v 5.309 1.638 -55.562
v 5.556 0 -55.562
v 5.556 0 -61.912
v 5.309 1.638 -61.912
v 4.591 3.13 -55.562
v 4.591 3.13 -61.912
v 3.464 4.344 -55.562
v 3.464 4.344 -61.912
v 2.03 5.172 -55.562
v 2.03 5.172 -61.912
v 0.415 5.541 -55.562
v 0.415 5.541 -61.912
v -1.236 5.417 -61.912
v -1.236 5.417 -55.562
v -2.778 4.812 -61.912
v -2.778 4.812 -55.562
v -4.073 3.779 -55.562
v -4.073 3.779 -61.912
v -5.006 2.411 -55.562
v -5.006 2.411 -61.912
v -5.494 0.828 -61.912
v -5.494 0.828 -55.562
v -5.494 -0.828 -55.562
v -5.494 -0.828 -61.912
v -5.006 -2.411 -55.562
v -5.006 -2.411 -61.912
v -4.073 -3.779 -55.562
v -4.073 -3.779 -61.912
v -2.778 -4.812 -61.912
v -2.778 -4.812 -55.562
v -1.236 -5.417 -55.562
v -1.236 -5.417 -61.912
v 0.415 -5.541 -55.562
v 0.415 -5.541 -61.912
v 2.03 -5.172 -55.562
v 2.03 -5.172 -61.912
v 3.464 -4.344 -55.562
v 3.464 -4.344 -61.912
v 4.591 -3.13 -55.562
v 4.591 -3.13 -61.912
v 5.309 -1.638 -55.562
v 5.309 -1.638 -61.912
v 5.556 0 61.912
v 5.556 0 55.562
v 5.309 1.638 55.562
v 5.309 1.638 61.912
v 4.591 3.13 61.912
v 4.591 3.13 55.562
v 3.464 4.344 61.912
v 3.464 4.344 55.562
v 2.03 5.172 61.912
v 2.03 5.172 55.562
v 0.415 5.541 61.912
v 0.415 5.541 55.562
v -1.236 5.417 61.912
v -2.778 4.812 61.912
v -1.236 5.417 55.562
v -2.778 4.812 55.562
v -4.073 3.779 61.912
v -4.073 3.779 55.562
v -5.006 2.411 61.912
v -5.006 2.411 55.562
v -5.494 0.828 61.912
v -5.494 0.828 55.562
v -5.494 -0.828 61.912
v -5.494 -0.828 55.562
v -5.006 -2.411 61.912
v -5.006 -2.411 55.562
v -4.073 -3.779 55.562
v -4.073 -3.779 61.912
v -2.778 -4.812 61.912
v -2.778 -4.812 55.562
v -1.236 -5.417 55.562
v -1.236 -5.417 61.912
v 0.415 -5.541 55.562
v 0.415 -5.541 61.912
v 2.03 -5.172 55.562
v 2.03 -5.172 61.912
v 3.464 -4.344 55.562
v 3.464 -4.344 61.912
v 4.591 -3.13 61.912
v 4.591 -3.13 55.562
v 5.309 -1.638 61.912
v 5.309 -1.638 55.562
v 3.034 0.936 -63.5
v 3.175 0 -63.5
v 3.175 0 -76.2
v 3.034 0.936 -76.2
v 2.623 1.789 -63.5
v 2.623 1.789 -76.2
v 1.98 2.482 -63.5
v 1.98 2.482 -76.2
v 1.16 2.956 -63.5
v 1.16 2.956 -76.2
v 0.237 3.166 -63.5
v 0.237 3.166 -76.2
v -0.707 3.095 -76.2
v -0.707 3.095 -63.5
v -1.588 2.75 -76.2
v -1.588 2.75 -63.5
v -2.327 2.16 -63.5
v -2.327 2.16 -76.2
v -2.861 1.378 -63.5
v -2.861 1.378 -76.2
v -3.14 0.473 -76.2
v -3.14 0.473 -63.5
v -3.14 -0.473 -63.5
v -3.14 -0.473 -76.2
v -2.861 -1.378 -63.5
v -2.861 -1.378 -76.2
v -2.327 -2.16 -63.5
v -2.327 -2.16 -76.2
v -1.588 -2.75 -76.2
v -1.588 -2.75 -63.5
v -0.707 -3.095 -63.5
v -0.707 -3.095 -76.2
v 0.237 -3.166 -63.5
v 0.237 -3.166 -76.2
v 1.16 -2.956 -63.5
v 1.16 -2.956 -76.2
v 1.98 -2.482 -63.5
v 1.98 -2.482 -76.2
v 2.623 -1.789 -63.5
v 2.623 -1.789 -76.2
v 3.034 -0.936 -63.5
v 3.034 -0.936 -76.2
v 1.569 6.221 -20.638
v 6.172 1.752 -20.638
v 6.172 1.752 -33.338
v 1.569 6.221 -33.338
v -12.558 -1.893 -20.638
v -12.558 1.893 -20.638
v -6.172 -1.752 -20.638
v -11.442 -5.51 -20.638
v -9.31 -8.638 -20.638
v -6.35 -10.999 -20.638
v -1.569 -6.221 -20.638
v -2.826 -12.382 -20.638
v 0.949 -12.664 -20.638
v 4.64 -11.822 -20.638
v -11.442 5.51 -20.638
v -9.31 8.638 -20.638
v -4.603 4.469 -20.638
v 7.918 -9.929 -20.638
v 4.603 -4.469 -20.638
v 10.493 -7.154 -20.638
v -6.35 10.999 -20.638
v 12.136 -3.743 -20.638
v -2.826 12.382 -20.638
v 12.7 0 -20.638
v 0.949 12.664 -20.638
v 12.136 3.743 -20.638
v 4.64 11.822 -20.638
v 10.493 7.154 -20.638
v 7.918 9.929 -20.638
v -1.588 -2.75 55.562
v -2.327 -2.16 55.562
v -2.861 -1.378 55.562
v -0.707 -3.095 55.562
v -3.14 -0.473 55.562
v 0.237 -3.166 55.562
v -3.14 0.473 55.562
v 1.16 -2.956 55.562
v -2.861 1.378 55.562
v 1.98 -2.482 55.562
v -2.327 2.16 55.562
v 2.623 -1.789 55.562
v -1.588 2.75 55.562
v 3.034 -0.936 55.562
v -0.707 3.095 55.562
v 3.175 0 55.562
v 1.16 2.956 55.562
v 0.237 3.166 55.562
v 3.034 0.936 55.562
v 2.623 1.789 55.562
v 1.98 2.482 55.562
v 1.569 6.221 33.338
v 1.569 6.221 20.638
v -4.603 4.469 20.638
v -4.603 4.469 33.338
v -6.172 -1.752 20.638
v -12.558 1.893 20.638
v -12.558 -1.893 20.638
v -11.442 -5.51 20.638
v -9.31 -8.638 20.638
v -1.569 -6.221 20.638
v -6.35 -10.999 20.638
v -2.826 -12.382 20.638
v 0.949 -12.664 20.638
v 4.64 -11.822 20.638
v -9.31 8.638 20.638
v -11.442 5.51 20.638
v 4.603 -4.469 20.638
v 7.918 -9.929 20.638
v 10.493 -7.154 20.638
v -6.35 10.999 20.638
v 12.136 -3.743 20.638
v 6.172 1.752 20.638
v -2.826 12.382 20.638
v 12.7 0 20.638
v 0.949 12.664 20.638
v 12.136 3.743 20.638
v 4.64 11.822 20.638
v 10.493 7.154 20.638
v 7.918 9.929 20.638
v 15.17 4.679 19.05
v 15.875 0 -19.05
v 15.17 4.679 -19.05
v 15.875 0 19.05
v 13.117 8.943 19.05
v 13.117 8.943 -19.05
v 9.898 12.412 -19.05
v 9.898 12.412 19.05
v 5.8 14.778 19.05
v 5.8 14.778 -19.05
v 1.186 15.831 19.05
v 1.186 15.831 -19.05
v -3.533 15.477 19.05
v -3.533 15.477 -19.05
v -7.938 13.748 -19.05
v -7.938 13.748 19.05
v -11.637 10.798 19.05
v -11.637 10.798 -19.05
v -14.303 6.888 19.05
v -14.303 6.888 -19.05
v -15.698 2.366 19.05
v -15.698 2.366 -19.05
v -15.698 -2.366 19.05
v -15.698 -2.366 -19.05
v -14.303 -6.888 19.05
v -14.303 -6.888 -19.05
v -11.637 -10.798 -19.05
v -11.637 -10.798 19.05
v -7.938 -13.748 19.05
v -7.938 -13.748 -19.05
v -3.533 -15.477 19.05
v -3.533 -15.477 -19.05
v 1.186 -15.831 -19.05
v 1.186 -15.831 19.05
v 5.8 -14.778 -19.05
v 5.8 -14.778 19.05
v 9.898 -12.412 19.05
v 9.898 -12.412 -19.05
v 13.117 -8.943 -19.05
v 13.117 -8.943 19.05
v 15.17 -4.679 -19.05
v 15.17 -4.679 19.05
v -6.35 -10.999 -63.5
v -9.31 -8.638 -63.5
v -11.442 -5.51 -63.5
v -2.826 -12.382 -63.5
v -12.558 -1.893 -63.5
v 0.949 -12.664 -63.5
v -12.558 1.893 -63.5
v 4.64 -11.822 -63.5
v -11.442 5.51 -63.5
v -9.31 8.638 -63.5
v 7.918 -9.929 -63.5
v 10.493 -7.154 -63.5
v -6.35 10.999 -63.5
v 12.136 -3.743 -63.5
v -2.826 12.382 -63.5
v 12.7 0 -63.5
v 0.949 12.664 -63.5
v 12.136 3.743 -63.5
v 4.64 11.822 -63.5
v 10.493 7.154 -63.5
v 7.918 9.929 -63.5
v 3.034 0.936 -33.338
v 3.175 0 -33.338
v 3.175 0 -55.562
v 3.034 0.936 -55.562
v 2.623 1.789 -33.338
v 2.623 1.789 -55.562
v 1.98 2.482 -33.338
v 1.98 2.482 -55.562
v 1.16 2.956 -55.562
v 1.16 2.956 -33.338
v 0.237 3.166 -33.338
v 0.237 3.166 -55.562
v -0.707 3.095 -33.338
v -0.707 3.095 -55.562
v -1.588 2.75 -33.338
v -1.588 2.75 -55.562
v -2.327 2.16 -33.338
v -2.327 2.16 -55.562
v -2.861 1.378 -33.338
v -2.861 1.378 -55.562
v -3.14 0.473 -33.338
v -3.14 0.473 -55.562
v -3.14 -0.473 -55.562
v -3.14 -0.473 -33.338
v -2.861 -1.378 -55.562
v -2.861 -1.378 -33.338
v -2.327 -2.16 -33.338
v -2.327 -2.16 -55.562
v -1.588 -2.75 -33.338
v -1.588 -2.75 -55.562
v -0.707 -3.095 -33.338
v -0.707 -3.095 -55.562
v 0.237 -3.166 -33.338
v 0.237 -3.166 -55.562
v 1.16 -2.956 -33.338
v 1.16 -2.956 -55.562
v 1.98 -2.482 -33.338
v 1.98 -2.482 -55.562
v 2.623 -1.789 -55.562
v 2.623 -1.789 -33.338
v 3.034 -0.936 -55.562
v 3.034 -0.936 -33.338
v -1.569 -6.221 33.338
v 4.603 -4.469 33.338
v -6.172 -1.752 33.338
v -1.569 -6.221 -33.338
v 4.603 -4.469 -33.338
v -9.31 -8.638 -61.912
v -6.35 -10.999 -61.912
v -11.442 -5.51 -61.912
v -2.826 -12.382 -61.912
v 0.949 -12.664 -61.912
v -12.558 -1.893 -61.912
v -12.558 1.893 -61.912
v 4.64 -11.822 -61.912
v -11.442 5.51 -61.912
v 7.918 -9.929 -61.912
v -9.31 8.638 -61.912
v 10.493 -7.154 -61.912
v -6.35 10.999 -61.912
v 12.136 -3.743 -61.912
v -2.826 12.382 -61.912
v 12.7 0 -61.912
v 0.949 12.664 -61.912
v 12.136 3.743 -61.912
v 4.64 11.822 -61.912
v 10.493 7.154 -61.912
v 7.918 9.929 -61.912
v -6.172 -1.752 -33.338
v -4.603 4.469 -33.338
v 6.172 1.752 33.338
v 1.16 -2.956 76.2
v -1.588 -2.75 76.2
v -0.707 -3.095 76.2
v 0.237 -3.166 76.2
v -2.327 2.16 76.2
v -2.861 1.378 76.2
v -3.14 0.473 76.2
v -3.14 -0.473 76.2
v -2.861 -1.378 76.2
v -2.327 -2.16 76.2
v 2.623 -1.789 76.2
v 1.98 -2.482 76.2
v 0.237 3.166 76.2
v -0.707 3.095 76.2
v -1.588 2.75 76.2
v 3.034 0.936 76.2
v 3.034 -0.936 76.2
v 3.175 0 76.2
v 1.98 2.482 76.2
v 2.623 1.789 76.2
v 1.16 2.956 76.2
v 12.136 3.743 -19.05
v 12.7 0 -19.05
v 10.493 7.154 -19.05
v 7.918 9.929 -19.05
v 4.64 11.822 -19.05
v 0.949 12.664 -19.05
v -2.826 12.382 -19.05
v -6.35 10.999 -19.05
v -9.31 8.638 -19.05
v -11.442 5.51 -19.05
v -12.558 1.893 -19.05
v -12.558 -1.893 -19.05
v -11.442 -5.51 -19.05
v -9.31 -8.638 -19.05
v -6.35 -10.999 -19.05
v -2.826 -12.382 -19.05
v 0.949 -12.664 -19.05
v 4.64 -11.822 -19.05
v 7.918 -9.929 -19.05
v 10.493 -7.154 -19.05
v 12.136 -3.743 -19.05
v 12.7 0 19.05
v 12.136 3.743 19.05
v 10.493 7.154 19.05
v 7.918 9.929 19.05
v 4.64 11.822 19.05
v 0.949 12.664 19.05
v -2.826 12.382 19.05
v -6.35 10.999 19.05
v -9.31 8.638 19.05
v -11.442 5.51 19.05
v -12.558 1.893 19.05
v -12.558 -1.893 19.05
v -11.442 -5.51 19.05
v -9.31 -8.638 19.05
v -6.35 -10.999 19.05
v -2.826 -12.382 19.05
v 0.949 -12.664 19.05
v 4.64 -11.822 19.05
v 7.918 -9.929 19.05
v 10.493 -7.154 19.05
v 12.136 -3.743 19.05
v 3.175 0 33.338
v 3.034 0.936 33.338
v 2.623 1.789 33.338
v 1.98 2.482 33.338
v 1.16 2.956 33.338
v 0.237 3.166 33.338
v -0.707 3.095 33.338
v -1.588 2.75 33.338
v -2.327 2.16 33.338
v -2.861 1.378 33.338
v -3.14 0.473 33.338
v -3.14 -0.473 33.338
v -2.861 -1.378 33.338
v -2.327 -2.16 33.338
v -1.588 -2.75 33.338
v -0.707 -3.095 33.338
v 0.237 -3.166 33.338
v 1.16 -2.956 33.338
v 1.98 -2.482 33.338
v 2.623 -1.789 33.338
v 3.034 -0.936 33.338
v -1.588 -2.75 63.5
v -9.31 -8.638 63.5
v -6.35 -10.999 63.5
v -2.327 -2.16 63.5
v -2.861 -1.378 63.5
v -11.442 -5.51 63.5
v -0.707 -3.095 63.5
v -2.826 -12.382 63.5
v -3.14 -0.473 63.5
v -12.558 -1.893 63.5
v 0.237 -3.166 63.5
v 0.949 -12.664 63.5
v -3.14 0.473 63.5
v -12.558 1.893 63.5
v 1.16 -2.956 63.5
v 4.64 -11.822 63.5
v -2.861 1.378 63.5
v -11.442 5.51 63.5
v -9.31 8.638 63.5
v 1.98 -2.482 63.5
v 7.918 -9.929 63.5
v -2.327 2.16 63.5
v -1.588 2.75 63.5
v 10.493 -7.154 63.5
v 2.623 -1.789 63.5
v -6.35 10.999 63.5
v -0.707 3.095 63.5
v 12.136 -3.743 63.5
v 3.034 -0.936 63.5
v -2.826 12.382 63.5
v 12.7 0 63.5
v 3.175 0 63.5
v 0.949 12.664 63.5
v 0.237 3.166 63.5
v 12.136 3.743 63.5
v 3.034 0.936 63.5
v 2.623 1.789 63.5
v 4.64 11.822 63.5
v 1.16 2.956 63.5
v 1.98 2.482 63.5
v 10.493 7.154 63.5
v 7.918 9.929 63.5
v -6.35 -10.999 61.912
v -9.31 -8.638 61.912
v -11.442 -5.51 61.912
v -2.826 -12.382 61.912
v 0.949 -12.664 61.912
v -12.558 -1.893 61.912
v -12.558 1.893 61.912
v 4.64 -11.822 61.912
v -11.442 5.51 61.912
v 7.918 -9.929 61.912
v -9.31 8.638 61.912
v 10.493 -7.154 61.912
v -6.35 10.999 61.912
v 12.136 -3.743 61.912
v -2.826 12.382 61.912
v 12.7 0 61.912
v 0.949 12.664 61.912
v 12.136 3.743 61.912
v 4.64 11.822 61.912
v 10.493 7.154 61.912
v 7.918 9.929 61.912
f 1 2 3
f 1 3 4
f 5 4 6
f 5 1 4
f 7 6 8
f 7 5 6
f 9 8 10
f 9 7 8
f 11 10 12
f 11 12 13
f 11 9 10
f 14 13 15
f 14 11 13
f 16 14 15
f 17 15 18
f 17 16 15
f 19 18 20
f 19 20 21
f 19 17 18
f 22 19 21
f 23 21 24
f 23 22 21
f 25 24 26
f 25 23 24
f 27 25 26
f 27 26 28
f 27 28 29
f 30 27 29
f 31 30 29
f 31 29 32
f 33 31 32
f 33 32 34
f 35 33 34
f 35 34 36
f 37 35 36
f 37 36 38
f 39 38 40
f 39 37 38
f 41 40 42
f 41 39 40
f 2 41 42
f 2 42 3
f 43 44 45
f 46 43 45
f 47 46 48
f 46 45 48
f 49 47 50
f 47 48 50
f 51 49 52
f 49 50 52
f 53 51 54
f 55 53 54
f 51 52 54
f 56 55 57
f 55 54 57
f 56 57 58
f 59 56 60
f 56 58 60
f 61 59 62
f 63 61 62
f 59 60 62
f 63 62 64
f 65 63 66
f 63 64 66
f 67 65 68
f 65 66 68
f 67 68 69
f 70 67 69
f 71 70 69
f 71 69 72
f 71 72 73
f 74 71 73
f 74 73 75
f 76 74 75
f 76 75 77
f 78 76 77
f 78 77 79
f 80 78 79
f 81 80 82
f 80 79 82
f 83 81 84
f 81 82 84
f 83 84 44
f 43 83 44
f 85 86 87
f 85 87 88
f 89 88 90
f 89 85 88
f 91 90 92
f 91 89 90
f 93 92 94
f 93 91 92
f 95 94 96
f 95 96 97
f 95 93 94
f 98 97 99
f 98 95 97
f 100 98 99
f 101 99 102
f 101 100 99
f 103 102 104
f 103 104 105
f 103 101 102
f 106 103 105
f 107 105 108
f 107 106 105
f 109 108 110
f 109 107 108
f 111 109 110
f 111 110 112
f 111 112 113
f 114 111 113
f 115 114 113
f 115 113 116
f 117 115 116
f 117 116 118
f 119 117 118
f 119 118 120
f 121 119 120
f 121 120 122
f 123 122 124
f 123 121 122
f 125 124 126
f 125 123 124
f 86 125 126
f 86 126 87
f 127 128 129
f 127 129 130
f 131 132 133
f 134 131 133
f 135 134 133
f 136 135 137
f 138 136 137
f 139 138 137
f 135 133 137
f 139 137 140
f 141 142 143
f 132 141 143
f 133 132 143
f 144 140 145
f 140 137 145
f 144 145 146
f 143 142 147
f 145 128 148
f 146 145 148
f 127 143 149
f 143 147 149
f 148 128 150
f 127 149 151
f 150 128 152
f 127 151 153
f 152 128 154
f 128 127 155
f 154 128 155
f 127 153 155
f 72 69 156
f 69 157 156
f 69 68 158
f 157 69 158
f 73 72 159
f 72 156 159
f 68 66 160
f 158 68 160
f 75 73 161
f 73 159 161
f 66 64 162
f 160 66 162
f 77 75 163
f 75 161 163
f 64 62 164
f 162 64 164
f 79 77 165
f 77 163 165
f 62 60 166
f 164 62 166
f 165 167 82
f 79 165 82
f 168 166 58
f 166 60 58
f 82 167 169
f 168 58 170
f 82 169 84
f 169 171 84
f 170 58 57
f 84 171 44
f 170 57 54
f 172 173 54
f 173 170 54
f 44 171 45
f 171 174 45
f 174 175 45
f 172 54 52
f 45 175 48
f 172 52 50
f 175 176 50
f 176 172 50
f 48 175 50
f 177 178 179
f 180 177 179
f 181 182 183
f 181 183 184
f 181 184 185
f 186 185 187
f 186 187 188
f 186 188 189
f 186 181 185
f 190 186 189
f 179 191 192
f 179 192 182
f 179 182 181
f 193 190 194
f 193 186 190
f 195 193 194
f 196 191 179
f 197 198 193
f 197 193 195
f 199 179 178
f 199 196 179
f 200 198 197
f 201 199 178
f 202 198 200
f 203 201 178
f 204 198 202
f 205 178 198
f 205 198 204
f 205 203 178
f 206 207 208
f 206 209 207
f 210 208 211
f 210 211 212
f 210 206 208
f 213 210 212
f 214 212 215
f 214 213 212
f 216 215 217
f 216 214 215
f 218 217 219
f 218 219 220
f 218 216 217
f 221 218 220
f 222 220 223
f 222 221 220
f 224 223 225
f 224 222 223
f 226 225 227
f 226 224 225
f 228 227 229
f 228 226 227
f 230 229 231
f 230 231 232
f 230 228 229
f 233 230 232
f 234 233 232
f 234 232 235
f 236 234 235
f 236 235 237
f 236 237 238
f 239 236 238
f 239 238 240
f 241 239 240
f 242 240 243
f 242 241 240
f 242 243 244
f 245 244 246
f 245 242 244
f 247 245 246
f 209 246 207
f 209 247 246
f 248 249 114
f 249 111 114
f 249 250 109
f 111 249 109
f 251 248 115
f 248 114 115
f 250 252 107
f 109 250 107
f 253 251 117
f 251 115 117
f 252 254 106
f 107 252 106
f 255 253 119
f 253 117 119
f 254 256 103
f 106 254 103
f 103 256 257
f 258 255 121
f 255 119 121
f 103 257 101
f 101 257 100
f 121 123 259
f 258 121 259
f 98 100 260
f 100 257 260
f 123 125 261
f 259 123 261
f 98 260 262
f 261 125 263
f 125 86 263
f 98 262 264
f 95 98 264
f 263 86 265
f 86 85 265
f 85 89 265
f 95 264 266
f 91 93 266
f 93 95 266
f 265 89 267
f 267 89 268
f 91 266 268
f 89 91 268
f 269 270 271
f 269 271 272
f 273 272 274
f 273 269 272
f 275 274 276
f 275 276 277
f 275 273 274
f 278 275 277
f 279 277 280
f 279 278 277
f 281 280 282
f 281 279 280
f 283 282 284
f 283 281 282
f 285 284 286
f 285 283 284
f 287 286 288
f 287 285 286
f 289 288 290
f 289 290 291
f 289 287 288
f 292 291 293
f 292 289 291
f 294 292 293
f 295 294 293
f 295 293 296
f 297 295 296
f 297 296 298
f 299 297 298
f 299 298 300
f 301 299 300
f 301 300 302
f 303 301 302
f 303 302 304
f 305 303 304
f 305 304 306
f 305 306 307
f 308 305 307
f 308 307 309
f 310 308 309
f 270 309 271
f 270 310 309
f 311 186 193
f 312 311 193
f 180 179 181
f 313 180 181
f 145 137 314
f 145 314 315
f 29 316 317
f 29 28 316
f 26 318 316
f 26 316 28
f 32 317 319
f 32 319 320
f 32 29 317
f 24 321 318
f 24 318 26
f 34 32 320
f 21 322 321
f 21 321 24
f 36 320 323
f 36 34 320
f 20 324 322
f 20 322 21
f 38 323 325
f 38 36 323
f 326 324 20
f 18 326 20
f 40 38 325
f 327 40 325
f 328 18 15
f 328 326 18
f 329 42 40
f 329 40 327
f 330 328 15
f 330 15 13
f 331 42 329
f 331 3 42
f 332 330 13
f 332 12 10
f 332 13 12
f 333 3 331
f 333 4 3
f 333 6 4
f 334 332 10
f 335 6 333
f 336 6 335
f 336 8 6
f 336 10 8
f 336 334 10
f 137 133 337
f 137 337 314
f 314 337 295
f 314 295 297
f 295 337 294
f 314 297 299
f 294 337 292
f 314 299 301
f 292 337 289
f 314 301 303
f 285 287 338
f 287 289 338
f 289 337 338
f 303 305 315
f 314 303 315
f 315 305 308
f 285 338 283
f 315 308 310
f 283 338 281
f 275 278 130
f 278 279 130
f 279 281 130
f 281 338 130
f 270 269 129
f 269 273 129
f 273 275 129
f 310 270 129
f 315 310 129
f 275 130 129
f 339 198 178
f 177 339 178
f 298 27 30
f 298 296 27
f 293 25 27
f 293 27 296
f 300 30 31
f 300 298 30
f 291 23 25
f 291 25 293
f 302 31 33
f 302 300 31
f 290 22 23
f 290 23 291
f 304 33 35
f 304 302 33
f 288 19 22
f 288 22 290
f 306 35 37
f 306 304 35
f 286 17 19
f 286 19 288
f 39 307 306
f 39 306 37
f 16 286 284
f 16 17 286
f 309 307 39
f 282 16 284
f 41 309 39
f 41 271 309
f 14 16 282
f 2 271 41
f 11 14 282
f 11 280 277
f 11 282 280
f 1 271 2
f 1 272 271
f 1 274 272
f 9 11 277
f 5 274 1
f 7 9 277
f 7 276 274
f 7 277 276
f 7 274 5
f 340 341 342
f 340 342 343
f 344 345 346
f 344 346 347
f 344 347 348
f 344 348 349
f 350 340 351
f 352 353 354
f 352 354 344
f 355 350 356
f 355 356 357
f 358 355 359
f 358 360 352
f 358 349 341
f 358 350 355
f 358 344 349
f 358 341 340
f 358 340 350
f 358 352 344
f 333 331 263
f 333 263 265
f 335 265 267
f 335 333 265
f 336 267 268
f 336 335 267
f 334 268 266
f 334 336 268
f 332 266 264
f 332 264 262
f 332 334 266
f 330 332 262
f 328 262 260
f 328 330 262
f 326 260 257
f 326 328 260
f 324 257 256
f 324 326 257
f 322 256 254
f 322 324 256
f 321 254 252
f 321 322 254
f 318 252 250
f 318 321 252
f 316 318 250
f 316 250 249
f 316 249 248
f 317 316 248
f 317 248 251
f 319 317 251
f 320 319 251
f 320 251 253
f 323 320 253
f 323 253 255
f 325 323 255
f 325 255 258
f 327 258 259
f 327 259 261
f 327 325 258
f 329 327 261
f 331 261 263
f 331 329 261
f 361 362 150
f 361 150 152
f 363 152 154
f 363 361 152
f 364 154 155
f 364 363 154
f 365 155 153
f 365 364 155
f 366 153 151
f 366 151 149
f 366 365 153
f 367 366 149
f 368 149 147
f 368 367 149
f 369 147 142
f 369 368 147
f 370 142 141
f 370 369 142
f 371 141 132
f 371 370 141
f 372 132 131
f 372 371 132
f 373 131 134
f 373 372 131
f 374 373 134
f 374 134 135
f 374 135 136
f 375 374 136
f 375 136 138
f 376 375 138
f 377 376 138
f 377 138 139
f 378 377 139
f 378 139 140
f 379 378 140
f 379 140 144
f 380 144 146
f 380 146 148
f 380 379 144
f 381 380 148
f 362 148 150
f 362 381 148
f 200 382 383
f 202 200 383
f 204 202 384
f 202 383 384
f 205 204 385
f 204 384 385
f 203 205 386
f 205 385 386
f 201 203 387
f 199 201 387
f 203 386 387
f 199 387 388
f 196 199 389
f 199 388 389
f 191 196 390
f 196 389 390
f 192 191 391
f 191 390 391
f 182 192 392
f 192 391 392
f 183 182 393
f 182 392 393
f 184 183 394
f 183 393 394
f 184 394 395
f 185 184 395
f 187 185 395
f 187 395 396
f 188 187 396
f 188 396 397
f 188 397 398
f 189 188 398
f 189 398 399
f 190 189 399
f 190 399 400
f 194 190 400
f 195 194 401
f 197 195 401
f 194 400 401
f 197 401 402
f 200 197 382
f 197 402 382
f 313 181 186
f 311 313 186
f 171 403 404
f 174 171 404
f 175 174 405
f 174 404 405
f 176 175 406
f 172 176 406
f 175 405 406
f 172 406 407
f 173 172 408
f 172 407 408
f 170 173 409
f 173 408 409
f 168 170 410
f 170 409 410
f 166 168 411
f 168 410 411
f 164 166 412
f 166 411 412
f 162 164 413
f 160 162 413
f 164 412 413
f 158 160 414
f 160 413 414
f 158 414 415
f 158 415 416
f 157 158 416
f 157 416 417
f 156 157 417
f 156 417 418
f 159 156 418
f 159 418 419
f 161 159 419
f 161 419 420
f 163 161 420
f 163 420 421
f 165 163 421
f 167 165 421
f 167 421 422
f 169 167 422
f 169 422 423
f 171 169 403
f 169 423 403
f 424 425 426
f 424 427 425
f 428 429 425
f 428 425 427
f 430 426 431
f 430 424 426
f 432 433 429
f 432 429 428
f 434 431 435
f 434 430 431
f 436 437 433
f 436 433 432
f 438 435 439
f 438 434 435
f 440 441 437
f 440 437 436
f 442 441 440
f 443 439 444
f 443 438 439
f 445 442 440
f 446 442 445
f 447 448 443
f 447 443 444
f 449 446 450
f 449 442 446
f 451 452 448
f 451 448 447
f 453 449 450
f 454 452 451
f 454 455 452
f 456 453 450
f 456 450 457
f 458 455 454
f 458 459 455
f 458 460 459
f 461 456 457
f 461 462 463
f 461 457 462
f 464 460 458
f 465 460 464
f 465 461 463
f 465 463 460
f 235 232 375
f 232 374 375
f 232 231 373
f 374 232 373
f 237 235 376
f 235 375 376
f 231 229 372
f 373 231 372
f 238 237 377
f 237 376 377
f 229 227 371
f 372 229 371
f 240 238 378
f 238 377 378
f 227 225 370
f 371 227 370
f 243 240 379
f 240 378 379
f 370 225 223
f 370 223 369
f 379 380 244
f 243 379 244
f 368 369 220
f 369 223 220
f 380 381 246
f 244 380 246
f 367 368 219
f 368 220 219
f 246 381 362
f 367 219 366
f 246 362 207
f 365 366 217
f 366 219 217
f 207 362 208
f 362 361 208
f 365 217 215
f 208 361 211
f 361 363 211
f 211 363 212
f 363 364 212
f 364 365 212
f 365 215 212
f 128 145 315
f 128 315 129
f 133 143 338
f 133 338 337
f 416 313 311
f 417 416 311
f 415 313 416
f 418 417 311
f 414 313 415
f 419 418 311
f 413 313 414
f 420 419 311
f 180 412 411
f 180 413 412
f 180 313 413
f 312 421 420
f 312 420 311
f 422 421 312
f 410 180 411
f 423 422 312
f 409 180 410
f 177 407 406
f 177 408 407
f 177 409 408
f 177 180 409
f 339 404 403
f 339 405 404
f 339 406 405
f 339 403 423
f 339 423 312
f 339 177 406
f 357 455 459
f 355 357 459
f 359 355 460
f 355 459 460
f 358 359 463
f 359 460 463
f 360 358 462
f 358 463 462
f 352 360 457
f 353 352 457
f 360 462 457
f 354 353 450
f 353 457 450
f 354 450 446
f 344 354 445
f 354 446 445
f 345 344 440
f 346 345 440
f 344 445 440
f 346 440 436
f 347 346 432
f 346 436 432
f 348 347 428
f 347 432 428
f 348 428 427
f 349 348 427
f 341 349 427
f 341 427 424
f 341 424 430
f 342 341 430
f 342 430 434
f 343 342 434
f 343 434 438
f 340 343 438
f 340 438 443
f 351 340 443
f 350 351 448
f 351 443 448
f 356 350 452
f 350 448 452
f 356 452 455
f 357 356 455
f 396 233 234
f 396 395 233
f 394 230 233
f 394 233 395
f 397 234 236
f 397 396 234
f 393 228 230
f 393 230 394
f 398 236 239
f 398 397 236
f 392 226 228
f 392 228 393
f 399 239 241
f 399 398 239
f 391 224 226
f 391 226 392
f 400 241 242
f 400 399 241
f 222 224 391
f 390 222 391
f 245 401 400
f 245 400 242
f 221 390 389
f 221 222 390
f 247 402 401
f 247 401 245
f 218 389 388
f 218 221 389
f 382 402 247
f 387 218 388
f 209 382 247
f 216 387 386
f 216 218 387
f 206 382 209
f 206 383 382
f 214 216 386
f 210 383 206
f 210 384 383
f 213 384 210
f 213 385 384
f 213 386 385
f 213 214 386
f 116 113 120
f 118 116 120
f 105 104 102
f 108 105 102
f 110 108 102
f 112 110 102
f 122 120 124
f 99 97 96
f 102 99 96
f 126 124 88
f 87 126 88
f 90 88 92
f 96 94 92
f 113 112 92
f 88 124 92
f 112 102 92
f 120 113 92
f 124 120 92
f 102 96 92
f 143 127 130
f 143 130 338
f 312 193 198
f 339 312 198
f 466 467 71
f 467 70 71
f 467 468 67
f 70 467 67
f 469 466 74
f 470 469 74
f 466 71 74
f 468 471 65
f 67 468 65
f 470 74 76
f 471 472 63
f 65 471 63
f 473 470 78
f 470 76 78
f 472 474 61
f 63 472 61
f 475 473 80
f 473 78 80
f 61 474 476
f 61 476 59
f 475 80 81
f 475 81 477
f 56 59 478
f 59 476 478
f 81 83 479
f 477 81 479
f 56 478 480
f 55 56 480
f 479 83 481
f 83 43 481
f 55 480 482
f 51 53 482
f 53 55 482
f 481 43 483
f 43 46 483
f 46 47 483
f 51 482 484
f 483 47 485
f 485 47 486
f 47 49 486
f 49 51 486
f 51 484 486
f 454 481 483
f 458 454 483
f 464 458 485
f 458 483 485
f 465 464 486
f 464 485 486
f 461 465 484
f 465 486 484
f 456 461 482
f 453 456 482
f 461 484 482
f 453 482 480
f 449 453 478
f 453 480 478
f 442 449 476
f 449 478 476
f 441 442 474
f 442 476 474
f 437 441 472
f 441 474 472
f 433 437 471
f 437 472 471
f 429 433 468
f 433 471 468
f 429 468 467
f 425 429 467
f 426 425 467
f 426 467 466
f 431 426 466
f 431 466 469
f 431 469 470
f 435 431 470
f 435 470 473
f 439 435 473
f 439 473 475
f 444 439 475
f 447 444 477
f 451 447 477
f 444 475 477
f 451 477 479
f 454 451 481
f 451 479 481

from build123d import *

# Parameters (mm, degrees)
SKETCH1_R           = 15.875
BOSS_EXTRUDE1_DEPTH = 19.05
SKETCH2_R           = 12.7
BOSS_EXTRUDE2_DEPTH = 1.5875
BOSS_EXTRUDE3_DEPTH = 12.7
SKETCH4_R           = 3.175
BOSS_EXTRUDE4_DEPTH = 22.225
SKETCH5_R           = 5.55625
BOSS_EXTRUDE6_DEPTH = 6.35
SKETCH6_R           = 12.7
BOSS_EXTRUDE7_DEPTH = 1.5875
SKETCH7_R           = 3.175
BOSS_EXTRUDE8_DEPTH = 12.7


with BuildPart() as part:
    # Sketch1 → Boss-Extrude1 (new body)
    with BuildSketch(Plane.XY):
        Circle(SKETCH1_R)
    boss_extrude1 = extrude(amount=BOSS_EXTRUDE1_DEPTH)

    # Sketch2 → Boss-Extrude2 (add)
    with BuildSketch(Plane.XY.offset(19.05)):
        Circle(SKETCH2_R)
    boss_extrude2 = extrude(amount=BOSS_EXTRUDE2_DEPTH)

    # Sketch3 → Boss-Extrude3 (add)
    with BuildSketch(Plane.XY.offset(20.6375)):
        Polygon((4.603141218, -4.469188183), (6.17200111, 1.75184314), (1.568859892, 6.221031323), (-4.603141218, 4.469188183), (-6.17200111, -1.75184314), (-1.568859892, -6.221031323), align=None)
    boss_extrude3 = extrude(amount=BOSS_EXTRUDE3_DEPTH)

    # Sketch4 → Boss-Extrude4 (add)
    with BuildSketch(Plane.XY.offset(33.3375)):
        Circle(SKETCH4_R)
    boss_extrude4 = extrude(amount=BOSS_EXTRUDE4_DEPTH)

    # Sketch5 → Boss-Extrude6 (add)
    with BuildSketch(Plane.XY.offset(55.5625)):
        Circle(SKETCH5_R)
    boss_extrude6 = extrude(amount=BOSS_EXTRUDE6_DEPTH)

    # Sketch6 → Boss-Extrude7 (add)
    with BuildSketch(Plane.XY.offset(61.9125)):
        Circle(SKETCH6_R)
    boss_extrude7 = extrude(amount=BOSS_EXTRUDE7_DEPTH)

    # Sketch7 → Boss-Extrude8 (add)
    with BuildSketch(Plane.XY.offset(63.5)):
        Circle(SKETCH7_R)
    boss_extrude8 = extrude(amount=BOSS_EXTRUDE8_DEPTH)

    # Mirror1: Boss-Extrude1, Boss-Extrude2, Boss-Extrude3, Boss-Extrude4, Boss-Extrude6, Boss-Extrude7, Boss-Extrude8 across plane
    add(boss_extrude1.mirror(Plane.XY))
    add(boss_extrude2.mirror(Plane.XY))
    add(boss_extrude3.mirror(Plane.XY))
    add(boss_extrude4.mirror(Plane.XY))
    add(boss_extrude6.mirror(Plane.XY))
    add(boss_extrude7.mirror(Plane.XY))
    add(boss_extrude8.mirror(Plane.XY))


solid = part.part
